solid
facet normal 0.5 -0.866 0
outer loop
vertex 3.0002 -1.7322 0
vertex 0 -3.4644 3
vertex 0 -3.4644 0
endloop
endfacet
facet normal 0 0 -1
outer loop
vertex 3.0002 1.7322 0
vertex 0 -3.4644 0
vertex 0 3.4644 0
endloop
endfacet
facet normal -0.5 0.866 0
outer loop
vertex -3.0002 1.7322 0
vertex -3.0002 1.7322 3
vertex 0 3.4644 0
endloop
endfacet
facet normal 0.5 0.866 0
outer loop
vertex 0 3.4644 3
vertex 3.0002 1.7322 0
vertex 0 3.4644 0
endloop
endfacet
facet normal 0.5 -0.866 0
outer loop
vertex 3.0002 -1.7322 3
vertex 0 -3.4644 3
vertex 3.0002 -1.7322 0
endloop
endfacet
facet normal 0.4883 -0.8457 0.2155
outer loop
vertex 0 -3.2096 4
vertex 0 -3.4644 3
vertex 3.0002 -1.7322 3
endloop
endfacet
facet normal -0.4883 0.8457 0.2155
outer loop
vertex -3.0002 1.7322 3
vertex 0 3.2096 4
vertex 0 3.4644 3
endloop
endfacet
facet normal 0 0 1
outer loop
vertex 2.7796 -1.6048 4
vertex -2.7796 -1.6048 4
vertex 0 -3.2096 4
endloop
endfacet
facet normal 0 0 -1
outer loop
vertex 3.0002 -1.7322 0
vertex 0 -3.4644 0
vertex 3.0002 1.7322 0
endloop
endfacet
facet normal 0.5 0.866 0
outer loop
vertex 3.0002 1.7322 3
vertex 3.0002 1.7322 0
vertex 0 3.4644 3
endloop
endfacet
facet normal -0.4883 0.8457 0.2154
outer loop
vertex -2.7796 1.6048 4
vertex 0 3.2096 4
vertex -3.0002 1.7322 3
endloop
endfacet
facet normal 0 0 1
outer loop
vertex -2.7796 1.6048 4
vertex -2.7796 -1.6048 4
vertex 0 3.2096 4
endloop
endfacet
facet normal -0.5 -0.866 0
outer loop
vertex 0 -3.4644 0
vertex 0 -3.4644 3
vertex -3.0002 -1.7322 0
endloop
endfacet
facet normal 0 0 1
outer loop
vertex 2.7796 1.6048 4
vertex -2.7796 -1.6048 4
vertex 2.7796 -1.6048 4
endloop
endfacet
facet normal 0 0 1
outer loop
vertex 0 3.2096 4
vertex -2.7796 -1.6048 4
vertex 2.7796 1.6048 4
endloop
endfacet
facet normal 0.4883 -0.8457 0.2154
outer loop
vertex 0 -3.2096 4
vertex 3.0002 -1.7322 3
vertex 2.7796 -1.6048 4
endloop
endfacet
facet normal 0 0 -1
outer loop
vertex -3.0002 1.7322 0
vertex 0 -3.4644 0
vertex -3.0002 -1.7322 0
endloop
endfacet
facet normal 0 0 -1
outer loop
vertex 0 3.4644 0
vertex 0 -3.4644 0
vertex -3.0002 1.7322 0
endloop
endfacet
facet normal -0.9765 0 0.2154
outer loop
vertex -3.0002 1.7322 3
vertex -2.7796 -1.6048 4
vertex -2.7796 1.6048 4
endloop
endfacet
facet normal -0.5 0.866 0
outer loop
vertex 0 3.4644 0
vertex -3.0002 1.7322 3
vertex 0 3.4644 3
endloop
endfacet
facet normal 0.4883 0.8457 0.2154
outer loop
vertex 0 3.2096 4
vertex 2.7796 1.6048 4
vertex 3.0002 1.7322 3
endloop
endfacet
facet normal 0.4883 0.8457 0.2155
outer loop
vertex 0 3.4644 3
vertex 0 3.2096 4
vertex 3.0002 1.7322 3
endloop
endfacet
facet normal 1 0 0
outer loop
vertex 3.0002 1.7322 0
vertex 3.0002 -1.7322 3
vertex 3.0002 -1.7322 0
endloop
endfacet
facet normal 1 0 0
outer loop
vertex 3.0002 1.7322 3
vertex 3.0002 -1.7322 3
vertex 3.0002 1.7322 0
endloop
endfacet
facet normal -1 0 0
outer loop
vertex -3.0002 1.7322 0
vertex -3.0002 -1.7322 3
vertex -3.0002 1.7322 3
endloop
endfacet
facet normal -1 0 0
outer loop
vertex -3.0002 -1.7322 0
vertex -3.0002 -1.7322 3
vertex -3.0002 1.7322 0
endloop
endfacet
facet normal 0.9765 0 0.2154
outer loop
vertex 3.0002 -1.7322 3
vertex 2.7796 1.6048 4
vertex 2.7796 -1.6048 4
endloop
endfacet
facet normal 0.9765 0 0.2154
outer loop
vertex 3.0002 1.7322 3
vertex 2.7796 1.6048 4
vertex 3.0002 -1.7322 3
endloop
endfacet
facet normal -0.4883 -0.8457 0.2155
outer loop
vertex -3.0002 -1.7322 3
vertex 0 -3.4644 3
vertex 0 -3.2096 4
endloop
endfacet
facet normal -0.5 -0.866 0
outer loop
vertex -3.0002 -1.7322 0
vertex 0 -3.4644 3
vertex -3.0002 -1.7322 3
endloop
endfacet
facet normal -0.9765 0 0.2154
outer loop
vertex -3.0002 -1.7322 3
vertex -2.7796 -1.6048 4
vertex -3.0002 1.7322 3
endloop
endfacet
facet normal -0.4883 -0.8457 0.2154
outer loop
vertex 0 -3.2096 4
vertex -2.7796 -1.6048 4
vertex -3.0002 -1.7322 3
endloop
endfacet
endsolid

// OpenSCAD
hull() {
								group() {
									union() {
										multmatrix([[0.866025, -0.5, 0, 0], [0.5, 0.866025, 0, 0], [0, 0, 1, 0], [0, 0, 0, 1]]) {
											group() {
												multmatrix([[1, 0, 0, 0], [0, 1, 0, 0], [0, 0, 1, 0], [0, 0, 0, 1]]) {
													group() {
														cylinder($fn = 6, $fa = 12, $fs = 2, h = 3, r1 = 3.46439, r2 = 3.46439, center = false);
													}
												}
											}
										}
									}
								}
								group() {
									multmatrix([[0.866025, -0.5, 0, 0], [0.5, 0.866025, 0, 0], [0, 0, 1, 0], [0, 0, 0, 1]]) {
										cylinder($fn = 6, $fa = 12, $fs = 2, h = 4, r1 = 3.20959, r2 = 3.20959, center = false);
									}
								}
							}
